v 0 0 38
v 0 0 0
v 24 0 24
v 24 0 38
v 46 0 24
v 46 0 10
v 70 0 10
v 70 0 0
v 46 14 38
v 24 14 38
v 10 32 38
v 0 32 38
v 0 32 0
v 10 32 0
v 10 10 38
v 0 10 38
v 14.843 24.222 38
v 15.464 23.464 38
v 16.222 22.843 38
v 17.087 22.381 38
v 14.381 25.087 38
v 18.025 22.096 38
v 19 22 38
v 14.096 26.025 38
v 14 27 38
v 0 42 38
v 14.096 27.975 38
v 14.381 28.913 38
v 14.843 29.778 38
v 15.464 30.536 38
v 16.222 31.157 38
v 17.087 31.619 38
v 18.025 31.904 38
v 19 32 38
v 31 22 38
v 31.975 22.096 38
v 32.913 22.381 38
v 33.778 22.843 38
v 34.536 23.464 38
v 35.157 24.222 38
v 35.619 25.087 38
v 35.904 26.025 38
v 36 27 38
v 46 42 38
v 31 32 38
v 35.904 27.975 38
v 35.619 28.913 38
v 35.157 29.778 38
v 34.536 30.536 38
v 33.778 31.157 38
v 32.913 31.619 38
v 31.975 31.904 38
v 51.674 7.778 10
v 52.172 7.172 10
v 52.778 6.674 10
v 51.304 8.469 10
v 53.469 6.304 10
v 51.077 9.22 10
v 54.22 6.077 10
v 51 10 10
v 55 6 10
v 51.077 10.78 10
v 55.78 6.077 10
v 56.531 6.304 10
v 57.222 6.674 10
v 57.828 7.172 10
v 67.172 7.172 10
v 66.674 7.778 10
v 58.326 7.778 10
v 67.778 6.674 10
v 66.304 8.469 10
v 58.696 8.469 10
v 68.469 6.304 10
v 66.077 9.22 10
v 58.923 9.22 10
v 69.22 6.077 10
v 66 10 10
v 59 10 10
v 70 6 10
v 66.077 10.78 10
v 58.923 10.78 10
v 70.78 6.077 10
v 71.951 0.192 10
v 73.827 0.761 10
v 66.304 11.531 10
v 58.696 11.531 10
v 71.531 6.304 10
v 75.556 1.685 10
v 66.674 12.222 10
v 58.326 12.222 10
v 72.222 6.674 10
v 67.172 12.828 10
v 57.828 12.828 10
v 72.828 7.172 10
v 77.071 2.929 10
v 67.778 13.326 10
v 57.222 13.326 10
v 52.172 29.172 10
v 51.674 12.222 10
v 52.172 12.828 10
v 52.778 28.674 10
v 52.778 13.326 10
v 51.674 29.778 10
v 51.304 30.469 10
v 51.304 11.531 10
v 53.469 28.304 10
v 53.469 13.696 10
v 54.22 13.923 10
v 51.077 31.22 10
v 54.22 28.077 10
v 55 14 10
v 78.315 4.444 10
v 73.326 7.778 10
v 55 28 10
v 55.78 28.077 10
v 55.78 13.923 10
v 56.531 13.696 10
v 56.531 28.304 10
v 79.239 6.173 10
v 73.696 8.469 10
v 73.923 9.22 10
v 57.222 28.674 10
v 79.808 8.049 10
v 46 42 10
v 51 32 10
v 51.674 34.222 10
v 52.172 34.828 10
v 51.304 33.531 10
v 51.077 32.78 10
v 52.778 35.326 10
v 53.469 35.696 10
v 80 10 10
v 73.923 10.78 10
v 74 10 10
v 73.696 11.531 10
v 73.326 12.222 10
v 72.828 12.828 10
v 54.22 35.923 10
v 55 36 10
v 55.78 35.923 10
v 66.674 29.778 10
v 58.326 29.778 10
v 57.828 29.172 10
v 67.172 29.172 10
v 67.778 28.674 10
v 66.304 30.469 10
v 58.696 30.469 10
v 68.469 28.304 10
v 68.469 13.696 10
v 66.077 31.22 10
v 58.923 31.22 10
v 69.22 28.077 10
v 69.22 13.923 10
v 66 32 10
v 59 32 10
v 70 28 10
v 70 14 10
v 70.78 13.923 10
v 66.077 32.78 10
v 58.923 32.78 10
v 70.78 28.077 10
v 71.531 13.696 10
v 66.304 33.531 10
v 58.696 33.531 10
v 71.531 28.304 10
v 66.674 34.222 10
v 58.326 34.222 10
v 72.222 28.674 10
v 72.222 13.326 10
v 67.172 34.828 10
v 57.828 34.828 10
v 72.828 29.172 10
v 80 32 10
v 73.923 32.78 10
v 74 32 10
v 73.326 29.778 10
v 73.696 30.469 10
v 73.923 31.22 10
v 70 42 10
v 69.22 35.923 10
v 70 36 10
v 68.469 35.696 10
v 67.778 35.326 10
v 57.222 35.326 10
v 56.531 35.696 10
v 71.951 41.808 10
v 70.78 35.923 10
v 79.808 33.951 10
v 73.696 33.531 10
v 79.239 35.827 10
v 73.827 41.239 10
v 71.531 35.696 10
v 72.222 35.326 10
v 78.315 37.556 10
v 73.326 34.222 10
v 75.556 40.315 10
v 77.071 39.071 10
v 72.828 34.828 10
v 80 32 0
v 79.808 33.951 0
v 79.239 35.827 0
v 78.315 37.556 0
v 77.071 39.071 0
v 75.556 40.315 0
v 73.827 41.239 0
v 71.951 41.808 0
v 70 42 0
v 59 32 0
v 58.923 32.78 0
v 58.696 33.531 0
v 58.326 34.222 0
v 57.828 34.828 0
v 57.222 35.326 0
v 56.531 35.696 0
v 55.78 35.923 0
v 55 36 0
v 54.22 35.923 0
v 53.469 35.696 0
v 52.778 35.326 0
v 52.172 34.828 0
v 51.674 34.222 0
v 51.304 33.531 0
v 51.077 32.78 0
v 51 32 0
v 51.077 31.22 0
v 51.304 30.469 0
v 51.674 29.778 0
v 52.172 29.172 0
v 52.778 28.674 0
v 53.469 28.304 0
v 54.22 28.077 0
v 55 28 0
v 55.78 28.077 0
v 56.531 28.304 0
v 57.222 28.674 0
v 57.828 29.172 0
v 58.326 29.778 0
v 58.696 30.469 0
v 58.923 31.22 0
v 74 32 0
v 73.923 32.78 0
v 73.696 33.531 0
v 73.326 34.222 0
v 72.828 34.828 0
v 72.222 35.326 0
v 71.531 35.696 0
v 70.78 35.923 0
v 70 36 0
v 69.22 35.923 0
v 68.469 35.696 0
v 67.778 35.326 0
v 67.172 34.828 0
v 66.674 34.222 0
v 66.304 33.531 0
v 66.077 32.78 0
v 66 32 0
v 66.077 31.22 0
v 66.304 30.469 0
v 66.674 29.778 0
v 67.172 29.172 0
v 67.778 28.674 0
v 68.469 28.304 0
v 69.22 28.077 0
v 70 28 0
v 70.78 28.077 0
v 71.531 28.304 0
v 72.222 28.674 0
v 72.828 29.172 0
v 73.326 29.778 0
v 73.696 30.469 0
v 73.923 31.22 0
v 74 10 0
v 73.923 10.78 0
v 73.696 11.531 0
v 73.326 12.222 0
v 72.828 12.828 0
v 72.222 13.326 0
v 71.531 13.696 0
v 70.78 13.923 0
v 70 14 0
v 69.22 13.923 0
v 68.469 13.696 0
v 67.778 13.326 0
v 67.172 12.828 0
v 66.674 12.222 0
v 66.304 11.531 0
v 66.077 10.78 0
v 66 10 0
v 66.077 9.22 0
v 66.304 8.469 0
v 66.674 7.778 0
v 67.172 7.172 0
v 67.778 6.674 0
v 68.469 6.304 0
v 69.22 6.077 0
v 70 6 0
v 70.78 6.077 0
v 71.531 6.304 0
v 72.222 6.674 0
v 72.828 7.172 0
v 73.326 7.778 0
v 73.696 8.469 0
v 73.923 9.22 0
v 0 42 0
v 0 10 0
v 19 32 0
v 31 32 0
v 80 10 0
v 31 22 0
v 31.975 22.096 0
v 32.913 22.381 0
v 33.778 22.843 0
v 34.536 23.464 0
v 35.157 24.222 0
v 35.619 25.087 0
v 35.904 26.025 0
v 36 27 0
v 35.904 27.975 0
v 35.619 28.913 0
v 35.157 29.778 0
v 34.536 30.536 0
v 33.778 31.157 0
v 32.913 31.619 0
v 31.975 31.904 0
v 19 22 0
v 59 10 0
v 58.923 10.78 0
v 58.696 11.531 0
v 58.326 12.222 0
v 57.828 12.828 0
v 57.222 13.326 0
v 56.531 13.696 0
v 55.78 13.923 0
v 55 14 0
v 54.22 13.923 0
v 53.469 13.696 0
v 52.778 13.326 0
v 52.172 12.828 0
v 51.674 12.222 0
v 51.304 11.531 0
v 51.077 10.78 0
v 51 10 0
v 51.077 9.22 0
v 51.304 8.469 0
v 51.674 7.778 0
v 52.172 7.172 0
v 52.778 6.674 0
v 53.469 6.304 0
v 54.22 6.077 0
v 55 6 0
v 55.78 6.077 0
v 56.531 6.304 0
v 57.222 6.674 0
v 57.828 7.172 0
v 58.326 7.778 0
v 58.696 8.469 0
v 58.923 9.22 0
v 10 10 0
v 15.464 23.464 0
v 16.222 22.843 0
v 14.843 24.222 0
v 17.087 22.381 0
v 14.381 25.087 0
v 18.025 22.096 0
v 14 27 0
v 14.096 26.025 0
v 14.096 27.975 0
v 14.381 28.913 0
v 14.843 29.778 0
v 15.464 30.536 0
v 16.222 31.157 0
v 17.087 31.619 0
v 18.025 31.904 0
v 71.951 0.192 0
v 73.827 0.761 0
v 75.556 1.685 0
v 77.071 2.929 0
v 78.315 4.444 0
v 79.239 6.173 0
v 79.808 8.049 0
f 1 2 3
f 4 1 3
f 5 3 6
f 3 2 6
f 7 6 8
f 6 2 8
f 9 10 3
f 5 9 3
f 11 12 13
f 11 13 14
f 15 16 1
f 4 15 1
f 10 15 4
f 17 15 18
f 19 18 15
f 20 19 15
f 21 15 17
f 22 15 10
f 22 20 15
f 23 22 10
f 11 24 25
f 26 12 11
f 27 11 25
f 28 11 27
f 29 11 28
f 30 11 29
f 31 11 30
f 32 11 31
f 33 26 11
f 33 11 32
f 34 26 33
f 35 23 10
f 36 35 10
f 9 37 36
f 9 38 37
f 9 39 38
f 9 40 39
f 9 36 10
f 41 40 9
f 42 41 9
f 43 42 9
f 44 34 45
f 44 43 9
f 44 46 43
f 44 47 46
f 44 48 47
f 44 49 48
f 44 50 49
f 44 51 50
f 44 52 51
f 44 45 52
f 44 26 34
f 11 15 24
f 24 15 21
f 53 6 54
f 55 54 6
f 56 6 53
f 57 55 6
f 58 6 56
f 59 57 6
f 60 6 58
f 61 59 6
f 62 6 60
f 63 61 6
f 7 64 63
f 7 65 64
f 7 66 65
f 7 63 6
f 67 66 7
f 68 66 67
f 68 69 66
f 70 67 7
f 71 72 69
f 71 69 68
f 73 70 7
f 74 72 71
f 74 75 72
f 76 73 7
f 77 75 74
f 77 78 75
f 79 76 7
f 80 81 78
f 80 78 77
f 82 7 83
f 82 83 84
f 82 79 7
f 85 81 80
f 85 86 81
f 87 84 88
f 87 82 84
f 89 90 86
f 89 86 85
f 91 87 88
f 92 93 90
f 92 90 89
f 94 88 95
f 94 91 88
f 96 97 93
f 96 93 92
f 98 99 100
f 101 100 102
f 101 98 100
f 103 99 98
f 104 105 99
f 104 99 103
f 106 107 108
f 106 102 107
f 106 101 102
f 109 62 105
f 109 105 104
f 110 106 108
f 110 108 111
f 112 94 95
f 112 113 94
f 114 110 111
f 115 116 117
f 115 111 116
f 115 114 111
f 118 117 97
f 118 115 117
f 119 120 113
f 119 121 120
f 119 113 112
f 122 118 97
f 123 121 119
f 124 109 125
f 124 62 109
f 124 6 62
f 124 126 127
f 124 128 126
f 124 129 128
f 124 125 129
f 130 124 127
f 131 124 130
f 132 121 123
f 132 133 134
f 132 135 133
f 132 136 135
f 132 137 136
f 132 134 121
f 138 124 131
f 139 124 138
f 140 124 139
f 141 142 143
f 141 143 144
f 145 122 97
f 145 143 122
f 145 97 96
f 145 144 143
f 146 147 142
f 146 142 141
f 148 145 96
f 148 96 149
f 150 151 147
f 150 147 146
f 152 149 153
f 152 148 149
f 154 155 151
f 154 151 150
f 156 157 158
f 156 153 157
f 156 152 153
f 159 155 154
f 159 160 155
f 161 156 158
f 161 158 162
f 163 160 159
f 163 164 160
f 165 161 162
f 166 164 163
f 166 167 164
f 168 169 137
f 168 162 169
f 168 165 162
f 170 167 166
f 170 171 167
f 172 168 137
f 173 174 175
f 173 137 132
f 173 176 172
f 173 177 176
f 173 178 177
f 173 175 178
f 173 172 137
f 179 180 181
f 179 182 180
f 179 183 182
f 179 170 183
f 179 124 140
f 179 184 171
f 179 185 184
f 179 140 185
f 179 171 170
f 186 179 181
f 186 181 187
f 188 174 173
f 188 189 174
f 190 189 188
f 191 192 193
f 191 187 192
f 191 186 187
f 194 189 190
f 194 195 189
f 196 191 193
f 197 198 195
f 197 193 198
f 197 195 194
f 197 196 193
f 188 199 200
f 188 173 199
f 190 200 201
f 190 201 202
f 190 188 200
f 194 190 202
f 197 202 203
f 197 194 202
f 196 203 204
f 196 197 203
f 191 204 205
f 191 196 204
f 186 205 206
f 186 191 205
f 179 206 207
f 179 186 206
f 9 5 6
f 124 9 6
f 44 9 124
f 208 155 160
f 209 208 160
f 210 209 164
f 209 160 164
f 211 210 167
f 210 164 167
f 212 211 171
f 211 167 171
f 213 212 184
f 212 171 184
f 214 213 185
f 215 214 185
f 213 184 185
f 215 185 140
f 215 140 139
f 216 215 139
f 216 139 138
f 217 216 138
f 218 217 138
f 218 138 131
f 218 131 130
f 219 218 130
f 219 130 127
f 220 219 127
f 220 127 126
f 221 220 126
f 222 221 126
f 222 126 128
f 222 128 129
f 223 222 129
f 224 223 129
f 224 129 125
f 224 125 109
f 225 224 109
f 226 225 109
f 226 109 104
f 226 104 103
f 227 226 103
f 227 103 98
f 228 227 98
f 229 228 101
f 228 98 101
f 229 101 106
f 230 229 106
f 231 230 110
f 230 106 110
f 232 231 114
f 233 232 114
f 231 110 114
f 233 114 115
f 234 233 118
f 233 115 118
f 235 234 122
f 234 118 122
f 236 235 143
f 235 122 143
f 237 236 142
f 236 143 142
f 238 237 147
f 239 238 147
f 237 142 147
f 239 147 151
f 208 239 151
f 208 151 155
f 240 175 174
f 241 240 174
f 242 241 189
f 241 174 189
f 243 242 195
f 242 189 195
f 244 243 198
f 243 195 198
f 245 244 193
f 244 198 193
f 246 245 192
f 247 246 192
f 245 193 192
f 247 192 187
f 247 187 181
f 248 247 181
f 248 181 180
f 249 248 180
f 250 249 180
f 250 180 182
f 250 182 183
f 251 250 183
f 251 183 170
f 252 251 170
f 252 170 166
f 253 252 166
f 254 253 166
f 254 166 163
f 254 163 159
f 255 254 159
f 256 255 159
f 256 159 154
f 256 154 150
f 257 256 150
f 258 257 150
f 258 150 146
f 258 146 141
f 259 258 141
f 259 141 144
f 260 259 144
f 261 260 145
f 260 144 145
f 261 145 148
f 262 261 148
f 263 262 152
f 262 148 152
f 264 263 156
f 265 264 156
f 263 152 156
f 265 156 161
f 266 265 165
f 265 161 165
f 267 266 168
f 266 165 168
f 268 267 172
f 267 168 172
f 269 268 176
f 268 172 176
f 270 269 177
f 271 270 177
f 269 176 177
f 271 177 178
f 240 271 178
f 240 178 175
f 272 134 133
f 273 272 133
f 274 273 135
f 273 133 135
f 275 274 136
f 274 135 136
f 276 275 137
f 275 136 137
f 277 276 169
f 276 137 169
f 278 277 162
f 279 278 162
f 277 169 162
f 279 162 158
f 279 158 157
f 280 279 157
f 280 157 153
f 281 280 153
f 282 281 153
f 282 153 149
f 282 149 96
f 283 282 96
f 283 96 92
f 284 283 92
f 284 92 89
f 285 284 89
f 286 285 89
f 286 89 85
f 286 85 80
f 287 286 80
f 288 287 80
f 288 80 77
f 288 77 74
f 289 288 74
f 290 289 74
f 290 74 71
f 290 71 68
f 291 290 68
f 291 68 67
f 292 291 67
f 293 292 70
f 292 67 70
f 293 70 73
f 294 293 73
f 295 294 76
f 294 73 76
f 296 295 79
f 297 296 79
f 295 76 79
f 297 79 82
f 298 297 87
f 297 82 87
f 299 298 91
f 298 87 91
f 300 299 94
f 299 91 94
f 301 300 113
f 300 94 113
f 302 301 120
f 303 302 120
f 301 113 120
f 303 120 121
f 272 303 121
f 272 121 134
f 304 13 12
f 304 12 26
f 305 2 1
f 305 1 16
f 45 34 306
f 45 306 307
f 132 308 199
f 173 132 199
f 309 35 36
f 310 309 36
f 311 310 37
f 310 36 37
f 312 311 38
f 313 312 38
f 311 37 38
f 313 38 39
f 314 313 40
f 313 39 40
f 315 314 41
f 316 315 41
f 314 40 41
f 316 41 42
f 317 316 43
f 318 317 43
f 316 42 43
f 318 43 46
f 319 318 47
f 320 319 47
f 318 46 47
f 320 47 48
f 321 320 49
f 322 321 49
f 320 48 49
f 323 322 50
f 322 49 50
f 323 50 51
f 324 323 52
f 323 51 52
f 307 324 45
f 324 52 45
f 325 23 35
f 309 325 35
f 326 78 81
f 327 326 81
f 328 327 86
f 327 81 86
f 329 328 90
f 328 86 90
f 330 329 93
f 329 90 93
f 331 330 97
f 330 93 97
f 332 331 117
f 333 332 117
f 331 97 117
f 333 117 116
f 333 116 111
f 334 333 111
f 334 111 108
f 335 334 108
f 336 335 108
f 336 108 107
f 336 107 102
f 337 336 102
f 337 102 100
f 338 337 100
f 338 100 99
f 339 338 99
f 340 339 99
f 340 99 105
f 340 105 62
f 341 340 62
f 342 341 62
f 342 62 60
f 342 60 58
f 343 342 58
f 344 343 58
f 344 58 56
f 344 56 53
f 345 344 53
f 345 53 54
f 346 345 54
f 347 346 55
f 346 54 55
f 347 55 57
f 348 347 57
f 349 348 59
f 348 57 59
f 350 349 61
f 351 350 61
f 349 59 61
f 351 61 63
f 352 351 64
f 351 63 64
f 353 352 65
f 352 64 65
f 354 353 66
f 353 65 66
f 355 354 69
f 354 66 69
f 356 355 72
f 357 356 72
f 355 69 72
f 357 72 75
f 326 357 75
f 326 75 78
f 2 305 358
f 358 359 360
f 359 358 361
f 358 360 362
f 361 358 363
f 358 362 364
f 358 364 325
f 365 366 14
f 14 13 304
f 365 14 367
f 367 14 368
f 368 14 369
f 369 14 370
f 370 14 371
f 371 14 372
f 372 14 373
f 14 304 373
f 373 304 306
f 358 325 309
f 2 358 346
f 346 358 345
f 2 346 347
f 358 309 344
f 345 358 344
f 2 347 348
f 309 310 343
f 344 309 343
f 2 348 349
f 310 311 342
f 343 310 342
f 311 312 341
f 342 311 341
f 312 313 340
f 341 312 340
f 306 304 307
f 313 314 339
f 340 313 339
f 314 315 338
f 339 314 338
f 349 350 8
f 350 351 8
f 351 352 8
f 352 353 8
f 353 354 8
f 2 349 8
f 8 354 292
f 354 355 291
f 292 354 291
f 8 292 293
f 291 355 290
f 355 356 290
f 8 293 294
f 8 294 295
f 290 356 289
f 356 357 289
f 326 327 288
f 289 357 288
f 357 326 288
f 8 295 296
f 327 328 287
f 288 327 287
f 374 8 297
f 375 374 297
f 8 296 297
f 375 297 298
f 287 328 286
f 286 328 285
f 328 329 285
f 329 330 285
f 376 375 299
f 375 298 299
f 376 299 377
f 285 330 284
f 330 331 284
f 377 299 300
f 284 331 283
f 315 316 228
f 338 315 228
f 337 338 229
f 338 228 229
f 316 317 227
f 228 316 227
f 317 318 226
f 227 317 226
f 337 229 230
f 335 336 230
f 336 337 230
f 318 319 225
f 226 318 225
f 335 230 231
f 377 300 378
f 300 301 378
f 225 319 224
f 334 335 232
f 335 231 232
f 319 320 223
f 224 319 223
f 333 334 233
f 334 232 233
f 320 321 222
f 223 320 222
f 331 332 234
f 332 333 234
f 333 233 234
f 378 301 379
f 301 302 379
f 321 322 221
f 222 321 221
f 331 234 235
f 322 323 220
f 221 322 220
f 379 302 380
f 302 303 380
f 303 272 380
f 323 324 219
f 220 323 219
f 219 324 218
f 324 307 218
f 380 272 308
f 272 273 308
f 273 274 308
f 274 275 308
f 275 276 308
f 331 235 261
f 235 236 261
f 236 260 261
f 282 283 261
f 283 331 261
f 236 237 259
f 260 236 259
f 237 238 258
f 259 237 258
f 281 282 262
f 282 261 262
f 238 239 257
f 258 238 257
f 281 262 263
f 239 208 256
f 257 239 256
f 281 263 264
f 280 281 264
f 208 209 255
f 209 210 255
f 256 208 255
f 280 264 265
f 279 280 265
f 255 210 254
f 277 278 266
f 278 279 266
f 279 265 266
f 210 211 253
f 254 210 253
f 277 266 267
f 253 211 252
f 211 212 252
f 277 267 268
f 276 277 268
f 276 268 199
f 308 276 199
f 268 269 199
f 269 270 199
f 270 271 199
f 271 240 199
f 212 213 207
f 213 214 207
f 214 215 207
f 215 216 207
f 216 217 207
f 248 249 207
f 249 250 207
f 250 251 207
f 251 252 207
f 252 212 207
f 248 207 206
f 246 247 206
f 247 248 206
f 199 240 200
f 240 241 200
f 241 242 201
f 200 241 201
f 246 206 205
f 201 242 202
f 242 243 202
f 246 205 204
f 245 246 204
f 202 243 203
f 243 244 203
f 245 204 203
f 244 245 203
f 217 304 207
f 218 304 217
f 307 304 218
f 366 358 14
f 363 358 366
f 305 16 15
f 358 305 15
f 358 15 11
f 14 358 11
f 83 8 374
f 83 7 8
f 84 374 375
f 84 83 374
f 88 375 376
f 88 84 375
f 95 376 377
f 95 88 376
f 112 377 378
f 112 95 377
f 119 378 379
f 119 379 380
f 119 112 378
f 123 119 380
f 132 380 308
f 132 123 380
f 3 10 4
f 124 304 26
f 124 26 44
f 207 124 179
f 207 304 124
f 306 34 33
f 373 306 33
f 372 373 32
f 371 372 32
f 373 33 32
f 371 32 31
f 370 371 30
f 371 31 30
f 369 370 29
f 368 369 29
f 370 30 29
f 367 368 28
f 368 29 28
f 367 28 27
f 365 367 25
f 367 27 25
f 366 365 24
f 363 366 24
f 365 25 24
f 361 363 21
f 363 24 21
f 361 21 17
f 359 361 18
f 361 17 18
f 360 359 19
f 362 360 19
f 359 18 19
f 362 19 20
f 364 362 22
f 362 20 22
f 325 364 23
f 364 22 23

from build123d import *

# Parameters (mm, degrees)
SKETCH_W        = 80
SKETCH_H        = 42
PAD_DEPTH       = 38
SKETCH001_W     = 34
SKETCH001_H     = 42
POCKET_DEPTH    = 28
SKETCH002_W     = 10
SKETCH002_H     = 22
POCKET001_DEPTH = 38
SKETCH003_R     = 4
POCKET002_DEPTH = 38
POCKET003_DEPTH = 38
POCKET004_DEPTH = 22
FILLET_R        = 10
FILLET001_R     = 10


with BuildPart() as part:
    # Sketch → Pad (new body)
    with BuildSketch(Plane.XY):
        with Locations((40, 21)):
            Rectangle(SKETCH_W, SKETCH_H)
    extrude(amount=PAD_DEPTH)

    # Sketch001 (on Face6 of Pad) → Pocket (cut)
    with BuildSketch(Plane.XY.offset(38)):
        with Locations((63, 21)):
            Rectangle(SKETCH001_W, SKETCH001_H)
    extrude(amount=-POCKET_DEPTH, mode=Mode.SUBTRACT)

    # Sketch002 (on Face6 of Pocket) → Pocket001 (cut)
    with BuildSketch(Plane.XY.offset(38)):
        with Locations((5, 21)):
            Rectangle(SKETCH002_W, SKETCH002_H)
    extrude(amount=-POCKET001_DEPTH, mode=Mode.SUBTRACT)

    # Sketch003 (on Face6 of Pocket001) → Pocket002 (cut)
    with BuildSketch(Plane.XY.offset(38)):
        with Locations((55, 32)):
            Circle(SKETCH003_R)
        with Locations((70, 32)):
            Circle(SKETCH003_R)
        with Locations((55, 10)):
            Circle(SKETCH003_R)
        with Locations((70, 10)):
            Circle(SKETCH003_R)
    extrude(amount=-POCKET002_DEPTH, mode=Mode.SUBTRACT)

    # Sketch004 (on Face6 of Pocket002) → Pocket003 (cut)
    with BuildSketch(Plane.XY.offset(38)):
        with BuildLine():
            ThreePointArc((19, 32), (14, 27), (19, 22))
            Line((19, 22), (31, 22))
            ThreePointArc((31, 22), (35.99997, 27), (31, 32))
            Line((19, 32), (31, 32))
        make_face()
    extrude(amount=-POCKET003_DEPTH, mode=Mode.SUBTRACT)

    # Sketch005 (on Face5 of Pocket003) → Pocket004 (cut)
    with BuildSketch(Plane.YZ.offset(46)):
        Polygon((0, 24), (0, 38), (14, 38), align=None)
    extrude(amount=-POCKET004_DEPTH, mode=Mode.SUBTRACT)

    # Fillet
    fillet_edges = [part.edges().sort_by_distance(p)[0] for p in [
        (80, 0, 5),
    ]]
    fillet(fillet_edges, radius=FILLET_R)

    # Fillet001
    fillet001_edges = [part.edges().sort_by_distance(p)[0] for p in [
        (80, 42, 5),
    ]]
    fillet(fillet001_edges, radius=FILLET001_R)


solid = part.part
